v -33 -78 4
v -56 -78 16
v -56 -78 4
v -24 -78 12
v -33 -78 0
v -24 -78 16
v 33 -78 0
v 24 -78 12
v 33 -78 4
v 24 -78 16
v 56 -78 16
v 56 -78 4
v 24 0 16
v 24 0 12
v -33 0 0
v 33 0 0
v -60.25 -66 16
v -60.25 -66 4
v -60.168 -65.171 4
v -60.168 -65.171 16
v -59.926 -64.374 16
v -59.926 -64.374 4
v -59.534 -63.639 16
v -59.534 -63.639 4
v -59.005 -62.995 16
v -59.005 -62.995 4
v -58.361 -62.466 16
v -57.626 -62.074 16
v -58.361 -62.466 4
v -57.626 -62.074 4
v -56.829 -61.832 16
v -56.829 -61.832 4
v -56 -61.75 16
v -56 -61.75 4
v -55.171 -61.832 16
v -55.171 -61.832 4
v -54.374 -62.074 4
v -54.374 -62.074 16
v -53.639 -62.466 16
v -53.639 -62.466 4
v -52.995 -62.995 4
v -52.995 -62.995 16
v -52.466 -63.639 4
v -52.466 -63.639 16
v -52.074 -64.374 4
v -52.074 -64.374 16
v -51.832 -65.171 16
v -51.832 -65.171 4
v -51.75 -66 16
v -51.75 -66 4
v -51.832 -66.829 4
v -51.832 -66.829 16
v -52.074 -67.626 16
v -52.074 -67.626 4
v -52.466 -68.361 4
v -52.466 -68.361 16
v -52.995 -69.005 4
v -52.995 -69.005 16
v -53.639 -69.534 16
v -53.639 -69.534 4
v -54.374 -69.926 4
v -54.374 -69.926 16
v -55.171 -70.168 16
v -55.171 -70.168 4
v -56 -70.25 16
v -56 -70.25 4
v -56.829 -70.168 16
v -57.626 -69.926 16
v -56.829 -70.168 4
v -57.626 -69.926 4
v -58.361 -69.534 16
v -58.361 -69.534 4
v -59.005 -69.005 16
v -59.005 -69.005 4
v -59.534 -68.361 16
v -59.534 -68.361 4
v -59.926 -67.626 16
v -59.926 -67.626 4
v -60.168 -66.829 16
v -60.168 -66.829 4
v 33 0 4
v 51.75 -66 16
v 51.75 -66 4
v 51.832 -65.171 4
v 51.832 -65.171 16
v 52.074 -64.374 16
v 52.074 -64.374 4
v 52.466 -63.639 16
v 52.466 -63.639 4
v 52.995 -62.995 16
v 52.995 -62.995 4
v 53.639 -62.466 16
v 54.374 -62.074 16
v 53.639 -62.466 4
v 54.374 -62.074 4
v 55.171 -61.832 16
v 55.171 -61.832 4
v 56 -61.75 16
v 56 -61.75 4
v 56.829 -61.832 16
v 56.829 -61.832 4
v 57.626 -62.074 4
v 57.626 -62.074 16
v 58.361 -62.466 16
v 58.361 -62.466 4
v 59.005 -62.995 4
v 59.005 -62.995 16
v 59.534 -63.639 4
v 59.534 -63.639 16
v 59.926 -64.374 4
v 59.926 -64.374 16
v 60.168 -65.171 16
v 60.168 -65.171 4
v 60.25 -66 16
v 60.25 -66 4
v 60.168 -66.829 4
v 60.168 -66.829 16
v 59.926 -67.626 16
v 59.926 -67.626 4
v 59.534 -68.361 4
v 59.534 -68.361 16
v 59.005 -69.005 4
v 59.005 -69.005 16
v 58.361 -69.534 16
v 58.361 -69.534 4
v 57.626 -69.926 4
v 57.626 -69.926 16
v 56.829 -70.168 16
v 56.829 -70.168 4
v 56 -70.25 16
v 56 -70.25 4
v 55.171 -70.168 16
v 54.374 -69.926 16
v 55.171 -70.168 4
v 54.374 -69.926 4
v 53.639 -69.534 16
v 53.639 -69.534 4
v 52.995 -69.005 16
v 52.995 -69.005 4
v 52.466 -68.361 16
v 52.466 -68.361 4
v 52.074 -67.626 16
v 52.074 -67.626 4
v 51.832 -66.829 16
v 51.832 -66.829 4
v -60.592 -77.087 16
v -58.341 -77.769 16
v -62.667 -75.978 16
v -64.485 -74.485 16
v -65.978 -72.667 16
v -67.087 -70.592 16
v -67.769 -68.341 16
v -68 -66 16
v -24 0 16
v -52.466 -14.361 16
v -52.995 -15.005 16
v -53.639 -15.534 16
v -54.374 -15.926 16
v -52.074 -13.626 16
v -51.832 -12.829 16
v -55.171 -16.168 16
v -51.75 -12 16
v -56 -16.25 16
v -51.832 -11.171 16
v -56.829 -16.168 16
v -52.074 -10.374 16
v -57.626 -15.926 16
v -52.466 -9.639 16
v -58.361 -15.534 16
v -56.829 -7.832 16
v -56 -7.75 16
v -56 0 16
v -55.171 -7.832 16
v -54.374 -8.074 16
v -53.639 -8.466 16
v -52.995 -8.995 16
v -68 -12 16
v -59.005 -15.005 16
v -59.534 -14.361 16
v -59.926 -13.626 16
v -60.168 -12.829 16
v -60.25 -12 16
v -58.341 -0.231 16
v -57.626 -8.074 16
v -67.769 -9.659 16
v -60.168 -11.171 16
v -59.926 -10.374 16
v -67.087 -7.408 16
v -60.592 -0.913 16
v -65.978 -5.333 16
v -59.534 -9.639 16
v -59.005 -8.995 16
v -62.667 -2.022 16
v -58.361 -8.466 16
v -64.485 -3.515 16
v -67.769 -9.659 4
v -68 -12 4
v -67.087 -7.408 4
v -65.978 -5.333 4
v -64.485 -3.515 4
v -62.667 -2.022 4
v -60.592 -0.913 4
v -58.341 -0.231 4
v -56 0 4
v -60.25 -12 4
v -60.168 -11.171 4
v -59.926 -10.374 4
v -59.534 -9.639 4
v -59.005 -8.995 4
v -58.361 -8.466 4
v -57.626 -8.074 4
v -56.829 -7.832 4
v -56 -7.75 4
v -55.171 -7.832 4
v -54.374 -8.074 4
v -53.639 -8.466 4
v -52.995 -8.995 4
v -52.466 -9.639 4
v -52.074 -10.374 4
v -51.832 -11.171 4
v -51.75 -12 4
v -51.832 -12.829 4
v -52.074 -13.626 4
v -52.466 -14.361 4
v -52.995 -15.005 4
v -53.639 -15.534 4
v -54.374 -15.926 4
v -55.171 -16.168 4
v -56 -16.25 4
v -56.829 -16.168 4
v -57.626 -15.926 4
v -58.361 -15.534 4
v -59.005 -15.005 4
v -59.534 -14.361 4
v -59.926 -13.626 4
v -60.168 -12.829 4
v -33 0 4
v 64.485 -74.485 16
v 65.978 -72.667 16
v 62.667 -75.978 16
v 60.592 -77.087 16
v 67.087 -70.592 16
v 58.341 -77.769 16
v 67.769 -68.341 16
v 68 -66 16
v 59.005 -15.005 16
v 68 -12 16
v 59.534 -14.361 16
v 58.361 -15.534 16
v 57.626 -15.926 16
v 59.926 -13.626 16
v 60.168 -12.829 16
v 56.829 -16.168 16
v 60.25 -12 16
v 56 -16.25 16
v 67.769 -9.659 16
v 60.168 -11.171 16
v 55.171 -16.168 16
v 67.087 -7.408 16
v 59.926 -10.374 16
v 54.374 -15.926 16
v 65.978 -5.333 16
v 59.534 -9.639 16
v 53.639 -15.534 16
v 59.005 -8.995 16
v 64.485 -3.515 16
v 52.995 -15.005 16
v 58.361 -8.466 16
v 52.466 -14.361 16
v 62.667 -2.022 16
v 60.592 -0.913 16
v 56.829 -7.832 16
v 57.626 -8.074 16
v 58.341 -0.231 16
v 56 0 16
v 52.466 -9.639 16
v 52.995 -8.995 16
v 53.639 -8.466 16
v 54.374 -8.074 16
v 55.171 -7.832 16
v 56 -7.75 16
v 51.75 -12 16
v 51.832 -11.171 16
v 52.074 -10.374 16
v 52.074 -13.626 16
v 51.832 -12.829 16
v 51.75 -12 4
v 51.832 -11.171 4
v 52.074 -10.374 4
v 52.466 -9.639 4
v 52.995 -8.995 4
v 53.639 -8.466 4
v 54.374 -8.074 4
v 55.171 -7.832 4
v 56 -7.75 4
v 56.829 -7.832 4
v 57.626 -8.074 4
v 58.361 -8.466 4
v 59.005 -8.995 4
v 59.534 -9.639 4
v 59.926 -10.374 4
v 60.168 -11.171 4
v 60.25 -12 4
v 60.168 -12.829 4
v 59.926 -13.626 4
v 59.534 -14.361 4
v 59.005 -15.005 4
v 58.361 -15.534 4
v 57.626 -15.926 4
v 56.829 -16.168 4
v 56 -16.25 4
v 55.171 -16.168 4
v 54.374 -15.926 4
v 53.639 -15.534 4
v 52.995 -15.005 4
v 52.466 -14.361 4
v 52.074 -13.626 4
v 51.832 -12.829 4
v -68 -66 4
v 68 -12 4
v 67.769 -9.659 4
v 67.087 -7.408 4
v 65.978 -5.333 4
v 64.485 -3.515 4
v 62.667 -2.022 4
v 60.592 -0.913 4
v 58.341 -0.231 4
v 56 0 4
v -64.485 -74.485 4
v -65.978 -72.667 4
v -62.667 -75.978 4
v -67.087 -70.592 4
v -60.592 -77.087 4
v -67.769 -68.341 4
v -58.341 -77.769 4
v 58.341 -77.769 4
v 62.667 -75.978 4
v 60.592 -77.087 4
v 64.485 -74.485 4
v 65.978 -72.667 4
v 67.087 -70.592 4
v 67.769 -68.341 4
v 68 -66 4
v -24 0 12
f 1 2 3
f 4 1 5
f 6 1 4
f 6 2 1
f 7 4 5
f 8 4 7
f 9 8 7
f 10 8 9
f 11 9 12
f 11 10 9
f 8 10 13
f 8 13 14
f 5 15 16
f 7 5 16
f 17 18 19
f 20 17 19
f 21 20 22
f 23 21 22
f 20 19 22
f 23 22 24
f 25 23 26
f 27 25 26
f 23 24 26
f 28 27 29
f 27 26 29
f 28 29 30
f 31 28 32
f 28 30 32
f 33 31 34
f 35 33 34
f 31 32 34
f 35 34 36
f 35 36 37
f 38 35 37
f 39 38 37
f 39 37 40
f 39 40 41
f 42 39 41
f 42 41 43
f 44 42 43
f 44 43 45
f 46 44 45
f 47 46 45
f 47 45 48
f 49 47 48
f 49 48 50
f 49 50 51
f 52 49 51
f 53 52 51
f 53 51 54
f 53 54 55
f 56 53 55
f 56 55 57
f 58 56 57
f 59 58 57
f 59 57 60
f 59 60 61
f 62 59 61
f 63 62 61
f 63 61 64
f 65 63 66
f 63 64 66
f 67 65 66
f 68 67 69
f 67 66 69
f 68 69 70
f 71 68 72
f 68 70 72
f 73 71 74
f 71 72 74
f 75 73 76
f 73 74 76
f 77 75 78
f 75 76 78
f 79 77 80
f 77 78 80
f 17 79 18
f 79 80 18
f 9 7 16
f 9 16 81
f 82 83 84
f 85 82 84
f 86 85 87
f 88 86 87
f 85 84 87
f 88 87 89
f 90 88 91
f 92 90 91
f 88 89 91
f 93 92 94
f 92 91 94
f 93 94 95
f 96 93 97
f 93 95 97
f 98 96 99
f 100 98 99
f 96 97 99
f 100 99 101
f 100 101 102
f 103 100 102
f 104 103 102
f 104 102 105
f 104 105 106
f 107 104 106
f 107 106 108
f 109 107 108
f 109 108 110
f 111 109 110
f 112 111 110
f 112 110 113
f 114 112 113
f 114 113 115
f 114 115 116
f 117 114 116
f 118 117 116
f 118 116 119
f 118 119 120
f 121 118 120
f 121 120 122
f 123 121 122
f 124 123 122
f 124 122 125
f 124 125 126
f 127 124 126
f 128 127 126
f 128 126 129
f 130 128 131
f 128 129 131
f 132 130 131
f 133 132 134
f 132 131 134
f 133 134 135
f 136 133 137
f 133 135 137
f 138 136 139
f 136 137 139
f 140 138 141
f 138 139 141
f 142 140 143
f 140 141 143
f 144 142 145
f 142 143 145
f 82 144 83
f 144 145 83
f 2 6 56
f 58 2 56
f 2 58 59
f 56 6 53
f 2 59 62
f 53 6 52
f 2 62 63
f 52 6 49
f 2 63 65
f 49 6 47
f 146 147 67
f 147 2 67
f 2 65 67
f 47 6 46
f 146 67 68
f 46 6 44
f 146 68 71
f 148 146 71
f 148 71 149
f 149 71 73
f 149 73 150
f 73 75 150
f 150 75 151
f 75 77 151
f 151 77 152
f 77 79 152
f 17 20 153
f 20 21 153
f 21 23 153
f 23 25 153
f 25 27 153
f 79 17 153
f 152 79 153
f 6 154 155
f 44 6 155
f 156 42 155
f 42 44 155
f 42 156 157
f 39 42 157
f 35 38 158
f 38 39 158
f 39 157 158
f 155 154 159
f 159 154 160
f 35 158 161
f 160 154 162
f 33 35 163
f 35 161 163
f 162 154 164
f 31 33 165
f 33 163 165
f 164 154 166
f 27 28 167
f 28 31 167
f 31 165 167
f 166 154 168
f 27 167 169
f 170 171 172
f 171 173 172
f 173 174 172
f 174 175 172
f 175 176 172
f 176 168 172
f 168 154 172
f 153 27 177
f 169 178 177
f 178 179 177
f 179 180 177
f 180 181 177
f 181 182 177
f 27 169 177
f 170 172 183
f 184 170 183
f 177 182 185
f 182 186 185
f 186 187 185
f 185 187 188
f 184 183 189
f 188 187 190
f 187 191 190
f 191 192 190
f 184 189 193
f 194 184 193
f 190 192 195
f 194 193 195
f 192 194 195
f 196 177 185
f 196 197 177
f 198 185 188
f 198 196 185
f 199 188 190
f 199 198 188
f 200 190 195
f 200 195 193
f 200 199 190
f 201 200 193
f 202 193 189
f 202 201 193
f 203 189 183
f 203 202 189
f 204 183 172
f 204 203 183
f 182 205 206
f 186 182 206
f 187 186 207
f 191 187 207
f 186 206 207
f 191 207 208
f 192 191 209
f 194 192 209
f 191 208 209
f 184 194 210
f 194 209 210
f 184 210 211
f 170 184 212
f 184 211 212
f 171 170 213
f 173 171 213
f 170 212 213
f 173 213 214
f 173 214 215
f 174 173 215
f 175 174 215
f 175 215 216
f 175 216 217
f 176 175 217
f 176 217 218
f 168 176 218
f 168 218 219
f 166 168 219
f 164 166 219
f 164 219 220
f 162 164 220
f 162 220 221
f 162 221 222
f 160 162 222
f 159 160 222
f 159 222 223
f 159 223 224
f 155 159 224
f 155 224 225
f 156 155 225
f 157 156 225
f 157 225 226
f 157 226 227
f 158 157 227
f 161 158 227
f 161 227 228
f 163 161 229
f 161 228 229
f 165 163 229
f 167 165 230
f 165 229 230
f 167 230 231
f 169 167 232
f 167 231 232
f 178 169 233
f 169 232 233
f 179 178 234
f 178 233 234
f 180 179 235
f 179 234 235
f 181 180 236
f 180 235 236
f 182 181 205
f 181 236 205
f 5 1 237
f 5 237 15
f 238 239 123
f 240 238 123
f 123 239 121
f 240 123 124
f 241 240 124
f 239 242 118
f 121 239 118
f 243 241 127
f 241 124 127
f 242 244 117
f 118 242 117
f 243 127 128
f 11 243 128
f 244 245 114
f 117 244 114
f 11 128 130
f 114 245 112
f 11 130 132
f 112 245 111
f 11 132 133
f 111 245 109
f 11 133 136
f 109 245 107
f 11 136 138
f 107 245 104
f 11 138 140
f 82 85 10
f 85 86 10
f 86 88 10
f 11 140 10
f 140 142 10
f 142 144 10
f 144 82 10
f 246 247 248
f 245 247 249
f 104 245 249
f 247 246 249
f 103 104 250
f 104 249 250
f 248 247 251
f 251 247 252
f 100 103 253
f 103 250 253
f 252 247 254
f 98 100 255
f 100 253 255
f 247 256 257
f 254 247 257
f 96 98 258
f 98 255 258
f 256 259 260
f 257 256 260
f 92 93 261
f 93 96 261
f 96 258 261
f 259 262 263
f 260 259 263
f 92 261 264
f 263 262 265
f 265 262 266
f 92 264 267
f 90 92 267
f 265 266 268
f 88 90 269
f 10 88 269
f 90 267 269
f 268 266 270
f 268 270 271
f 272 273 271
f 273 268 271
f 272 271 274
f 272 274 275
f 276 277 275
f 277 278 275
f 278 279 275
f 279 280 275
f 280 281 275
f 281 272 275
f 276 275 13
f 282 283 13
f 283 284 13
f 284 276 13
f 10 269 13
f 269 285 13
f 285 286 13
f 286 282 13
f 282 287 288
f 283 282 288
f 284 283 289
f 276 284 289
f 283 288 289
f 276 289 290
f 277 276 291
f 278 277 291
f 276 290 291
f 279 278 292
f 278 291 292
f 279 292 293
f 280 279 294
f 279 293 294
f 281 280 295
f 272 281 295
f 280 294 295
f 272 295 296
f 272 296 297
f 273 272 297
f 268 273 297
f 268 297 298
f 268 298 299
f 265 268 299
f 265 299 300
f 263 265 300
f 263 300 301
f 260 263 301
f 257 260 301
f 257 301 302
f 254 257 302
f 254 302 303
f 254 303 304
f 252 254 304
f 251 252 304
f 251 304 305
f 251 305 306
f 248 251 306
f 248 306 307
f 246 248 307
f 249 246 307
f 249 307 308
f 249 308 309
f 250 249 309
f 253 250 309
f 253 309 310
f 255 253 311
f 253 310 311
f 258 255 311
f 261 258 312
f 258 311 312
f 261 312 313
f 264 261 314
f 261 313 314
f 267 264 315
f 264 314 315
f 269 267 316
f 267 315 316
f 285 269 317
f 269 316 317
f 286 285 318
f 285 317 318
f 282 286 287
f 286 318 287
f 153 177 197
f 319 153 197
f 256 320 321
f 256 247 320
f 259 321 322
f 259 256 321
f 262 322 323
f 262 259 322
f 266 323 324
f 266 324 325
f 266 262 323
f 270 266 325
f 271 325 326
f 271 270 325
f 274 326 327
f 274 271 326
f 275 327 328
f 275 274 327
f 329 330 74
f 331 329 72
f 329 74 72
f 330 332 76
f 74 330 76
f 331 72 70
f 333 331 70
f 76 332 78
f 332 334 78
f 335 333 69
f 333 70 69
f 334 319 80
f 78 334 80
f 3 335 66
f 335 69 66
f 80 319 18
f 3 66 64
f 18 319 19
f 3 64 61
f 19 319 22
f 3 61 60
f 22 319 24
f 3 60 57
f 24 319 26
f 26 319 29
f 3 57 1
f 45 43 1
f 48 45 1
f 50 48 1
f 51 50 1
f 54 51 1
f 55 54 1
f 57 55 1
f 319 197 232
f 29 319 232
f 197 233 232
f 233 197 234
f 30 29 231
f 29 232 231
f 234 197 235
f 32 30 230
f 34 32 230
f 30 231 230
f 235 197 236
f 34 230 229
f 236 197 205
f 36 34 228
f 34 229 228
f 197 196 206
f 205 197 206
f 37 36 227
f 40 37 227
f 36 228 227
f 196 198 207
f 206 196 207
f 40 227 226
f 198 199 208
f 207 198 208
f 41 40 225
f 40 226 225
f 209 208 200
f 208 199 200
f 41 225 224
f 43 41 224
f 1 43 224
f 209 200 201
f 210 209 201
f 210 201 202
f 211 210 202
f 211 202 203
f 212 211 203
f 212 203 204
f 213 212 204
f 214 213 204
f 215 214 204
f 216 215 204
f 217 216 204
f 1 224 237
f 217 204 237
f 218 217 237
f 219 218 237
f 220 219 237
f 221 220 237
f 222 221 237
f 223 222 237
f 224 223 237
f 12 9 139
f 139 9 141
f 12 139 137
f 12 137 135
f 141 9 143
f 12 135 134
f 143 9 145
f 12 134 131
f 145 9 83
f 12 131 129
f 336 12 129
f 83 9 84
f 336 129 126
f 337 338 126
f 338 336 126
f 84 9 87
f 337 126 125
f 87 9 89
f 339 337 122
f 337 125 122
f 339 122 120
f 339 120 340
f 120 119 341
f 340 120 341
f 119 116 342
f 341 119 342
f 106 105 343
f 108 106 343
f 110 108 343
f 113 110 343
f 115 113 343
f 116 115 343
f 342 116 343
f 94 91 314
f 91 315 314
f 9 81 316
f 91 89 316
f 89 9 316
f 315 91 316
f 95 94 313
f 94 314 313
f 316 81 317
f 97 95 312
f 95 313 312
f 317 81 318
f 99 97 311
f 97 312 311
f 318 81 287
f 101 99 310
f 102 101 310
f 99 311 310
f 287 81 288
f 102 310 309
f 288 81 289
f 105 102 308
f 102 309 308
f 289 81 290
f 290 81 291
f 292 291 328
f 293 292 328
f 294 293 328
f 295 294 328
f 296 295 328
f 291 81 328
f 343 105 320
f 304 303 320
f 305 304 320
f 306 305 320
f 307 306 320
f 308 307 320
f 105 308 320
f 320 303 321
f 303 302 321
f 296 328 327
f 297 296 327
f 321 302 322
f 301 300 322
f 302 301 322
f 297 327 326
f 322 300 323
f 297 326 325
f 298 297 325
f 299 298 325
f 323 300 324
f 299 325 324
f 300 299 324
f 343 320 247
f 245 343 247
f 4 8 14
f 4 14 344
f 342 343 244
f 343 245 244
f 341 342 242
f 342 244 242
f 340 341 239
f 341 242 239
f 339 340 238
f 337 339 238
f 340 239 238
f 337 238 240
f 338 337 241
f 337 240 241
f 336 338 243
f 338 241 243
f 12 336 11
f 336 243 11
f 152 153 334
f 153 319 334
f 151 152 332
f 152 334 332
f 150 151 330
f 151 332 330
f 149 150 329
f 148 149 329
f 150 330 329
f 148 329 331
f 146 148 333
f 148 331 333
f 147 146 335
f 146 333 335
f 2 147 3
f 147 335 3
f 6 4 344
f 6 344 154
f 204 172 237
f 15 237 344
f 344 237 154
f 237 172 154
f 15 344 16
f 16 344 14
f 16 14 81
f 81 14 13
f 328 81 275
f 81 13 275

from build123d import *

# Parameters (mm, degrees)
F1_DEPTH = 78
F2_R     = 12
F4_D     = 8.5


with BuildPart() as f1:
    # F0 (on Front) → F1 (new body)
    with BuildSketch(Plane.XZ):
        Polygon((-33, 4), (-33, 0), (33, 0), (33, 4), (68, 4), (68, 16), (24, 16), (24, 12), (-24, 12), (-24, 16), (-68, 16), (-68, 4), align=None)
    extrude(amount=F1_DEPTH)

    # F2
    f2_edges = [f1.edges().sort_by_distance(p)[0] for p in [
        (-68, -78, 10),
        (68, -78, 10),
        (68, 0, 10),
        (-68, 0, 10),
    ]]
    fillet(f2_edges, radius=F2_R)

    # F4 (through all)
    with Locations(Plane.XY.offset(16)):
        with Locations((-56, -66), (-56, -12), (56, -66), (56, -12)):
            Hole(F4_D / 2)


solid = f1.part
